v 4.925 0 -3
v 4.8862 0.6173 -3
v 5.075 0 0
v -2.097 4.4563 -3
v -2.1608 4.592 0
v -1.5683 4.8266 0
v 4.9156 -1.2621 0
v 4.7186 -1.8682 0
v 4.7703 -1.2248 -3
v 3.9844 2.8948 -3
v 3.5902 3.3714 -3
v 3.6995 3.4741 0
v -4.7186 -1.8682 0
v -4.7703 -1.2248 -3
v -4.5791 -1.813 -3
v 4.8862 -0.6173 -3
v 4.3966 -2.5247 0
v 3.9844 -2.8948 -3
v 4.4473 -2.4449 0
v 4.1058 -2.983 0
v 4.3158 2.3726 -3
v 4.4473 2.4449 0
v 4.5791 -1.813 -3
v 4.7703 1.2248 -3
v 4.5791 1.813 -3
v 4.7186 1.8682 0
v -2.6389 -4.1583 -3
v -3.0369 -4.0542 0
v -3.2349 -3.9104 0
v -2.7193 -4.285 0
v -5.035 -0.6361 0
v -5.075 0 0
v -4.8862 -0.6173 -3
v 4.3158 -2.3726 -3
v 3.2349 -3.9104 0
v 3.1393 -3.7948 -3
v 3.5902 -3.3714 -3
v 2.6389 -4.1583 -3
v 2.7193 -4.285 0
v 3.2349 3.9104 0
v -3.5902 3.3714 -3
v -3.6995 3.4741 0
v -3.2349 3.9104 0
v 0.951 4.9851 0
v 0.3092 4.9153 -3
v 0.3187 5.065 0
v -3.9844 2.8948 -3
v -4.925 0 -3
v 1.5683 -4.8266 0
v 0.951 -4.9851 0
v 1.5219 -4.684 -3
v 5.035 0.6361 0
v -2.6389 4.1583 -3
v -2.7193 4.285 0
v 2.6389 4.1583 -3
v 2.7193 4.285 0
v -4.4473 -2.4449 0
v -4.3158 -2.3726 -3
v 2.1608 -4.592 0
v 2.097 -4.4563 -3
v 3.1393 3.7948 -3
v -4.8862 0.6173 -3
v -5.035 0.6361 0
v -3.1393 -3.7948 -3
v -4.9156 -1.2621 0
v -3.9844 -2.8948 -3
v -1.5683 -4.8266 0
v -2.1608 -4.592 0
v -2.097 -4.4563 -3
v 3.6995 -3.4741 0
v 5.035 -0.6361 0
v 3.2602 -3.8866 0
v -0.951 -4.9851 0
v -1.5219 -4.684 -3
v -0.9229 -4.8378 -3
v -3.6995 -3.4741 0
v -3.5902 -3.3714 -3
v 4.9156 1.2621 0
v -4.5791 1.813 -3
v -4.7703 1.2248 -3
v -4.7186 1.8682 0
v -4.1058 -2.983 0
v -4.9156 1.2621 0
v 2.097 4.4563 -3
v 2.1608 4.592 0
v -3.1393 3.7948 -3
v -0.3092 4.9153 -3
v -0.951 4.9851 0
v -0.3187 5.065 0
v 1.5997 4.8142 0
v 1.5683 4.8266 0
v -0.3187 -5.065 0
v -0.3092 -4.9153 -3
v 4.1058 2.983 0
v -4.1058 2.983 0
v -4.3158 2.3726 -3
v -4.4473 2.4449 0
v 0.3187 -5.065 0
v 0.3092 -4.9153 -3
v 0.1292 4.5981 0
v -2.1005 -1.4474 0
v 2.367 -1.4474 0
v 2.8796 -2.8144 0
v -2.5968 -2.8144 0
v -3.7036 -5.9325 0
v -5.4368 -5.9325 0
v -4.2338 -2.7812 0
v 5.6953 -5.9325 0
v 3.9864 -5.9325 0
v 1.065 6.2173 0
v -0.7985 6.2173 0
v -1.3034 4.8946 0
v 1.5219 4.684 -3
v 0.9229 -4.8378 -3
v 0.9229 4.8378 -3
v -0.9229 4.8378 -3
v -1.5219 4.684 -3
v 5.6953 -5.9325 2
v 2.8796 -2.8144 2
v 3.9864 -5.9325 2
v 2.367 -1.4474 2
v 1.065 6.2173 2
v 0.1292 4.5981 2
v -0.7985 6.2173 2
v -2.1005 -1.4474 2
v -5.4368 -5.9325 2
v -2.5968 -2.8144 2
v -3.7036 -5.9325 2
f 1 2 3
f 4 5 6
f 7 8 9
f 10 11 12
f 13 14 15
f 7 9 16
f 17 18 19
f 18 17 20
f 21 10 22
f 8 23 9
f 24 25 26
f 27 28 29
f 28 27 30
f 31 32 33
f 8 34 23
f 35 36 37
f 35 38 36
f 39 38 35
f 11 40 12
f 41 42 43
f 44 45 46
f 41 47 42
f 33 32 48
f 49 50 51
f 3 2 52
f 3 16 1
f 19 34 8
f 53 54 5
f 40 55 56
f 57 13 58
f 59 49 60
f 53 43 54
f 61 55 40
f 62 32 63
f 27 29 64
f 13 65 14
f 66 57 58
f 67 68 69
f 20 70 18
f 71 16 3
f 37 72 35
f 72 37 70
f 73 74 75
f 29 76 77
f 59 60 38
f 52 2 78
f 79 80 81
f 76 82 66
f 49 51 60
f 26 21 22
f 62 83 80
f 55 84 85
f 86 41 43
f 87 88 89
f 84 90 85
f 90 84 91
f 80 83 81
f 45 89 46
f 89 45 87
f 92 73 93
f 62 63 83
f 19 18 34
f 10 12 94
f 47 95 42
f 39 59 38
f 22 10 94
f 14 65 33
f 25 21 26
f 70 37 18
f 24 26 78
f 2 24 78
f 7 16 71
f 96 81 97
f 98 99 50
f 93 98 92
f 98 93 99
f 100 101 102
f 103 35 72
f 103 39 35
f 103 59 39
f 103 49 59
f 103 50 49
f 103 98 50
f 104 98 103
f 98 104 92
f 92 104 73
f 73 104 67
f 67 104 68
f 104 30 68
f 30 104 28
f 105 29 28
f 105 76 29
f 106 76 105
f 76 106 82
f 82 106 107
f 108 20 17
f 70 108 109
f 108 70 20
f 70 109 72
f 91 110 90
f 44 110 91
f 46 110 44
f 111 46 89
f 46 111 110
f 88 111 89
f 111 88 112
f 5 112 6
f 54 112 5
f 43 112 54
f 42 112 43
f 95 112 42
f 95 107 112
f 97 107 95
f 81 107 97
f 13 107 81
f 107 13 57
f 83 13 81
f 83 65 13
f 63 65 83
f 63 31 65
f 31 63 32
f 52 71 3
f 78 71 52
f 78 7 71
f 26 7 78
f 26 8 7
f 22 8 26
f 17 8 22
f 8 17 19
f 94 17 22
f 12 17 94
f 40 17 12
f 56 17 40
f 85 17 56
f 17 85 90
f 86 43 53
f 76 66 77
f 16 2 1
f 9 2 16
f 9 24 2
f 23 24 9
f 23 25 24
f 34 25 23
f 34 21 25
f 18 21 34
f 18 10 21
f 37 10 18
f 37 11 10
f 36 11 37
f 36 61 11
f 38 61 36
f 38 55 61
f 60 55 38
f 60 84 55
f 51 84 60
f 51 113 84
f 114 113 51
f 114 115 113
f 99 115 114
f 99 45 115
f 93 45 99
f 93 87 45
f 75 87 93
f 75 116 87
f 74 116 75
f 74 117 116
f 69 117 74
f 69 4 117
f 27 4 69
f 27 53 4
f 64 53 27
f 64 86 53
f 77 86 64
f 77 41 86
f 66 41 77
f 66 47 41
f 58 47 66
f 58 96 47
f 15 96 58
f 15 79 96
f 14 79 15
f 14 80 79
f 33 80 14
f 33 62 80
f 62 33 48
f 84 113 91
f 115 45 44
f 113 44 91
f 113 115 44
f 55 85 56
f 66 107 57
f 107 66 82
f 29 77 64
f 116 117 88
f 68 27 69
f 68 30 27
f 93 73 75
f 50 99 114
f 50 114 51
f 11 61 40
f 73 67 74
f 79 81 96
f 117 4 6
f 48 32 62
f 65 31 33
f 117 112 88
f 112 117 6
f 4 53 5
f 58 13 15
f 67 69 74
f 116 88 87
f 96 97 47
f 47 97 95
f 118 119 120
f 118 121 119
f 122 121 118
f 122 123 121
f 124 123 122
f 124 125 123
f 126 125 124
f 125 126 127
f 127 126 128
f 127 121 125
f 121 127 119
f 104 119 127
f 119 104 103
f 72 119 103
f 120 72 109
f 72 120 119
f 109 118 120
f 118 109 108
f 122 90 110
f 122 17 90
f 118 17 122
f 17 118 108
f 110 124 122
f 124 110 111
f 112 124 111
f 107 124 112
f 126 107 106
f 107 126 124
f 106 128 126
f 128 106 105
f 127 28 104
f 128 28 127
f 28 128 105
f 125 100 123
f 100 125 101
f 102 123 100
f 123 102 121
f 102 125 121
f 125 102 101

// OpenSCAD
$fn = 50;


difference() {
	union() {
		translate(v = [0, 0, -3.0000000000]) {
			cylinder(h = 3, r1 = 4.9250000000, r2 = 5.0750000000);
		}
		linear_extrude(height = 2) {
			text(font = "Impact", halign = "center", size = 12, text = "A", valign = "center");
		}
	}
	union();
}
